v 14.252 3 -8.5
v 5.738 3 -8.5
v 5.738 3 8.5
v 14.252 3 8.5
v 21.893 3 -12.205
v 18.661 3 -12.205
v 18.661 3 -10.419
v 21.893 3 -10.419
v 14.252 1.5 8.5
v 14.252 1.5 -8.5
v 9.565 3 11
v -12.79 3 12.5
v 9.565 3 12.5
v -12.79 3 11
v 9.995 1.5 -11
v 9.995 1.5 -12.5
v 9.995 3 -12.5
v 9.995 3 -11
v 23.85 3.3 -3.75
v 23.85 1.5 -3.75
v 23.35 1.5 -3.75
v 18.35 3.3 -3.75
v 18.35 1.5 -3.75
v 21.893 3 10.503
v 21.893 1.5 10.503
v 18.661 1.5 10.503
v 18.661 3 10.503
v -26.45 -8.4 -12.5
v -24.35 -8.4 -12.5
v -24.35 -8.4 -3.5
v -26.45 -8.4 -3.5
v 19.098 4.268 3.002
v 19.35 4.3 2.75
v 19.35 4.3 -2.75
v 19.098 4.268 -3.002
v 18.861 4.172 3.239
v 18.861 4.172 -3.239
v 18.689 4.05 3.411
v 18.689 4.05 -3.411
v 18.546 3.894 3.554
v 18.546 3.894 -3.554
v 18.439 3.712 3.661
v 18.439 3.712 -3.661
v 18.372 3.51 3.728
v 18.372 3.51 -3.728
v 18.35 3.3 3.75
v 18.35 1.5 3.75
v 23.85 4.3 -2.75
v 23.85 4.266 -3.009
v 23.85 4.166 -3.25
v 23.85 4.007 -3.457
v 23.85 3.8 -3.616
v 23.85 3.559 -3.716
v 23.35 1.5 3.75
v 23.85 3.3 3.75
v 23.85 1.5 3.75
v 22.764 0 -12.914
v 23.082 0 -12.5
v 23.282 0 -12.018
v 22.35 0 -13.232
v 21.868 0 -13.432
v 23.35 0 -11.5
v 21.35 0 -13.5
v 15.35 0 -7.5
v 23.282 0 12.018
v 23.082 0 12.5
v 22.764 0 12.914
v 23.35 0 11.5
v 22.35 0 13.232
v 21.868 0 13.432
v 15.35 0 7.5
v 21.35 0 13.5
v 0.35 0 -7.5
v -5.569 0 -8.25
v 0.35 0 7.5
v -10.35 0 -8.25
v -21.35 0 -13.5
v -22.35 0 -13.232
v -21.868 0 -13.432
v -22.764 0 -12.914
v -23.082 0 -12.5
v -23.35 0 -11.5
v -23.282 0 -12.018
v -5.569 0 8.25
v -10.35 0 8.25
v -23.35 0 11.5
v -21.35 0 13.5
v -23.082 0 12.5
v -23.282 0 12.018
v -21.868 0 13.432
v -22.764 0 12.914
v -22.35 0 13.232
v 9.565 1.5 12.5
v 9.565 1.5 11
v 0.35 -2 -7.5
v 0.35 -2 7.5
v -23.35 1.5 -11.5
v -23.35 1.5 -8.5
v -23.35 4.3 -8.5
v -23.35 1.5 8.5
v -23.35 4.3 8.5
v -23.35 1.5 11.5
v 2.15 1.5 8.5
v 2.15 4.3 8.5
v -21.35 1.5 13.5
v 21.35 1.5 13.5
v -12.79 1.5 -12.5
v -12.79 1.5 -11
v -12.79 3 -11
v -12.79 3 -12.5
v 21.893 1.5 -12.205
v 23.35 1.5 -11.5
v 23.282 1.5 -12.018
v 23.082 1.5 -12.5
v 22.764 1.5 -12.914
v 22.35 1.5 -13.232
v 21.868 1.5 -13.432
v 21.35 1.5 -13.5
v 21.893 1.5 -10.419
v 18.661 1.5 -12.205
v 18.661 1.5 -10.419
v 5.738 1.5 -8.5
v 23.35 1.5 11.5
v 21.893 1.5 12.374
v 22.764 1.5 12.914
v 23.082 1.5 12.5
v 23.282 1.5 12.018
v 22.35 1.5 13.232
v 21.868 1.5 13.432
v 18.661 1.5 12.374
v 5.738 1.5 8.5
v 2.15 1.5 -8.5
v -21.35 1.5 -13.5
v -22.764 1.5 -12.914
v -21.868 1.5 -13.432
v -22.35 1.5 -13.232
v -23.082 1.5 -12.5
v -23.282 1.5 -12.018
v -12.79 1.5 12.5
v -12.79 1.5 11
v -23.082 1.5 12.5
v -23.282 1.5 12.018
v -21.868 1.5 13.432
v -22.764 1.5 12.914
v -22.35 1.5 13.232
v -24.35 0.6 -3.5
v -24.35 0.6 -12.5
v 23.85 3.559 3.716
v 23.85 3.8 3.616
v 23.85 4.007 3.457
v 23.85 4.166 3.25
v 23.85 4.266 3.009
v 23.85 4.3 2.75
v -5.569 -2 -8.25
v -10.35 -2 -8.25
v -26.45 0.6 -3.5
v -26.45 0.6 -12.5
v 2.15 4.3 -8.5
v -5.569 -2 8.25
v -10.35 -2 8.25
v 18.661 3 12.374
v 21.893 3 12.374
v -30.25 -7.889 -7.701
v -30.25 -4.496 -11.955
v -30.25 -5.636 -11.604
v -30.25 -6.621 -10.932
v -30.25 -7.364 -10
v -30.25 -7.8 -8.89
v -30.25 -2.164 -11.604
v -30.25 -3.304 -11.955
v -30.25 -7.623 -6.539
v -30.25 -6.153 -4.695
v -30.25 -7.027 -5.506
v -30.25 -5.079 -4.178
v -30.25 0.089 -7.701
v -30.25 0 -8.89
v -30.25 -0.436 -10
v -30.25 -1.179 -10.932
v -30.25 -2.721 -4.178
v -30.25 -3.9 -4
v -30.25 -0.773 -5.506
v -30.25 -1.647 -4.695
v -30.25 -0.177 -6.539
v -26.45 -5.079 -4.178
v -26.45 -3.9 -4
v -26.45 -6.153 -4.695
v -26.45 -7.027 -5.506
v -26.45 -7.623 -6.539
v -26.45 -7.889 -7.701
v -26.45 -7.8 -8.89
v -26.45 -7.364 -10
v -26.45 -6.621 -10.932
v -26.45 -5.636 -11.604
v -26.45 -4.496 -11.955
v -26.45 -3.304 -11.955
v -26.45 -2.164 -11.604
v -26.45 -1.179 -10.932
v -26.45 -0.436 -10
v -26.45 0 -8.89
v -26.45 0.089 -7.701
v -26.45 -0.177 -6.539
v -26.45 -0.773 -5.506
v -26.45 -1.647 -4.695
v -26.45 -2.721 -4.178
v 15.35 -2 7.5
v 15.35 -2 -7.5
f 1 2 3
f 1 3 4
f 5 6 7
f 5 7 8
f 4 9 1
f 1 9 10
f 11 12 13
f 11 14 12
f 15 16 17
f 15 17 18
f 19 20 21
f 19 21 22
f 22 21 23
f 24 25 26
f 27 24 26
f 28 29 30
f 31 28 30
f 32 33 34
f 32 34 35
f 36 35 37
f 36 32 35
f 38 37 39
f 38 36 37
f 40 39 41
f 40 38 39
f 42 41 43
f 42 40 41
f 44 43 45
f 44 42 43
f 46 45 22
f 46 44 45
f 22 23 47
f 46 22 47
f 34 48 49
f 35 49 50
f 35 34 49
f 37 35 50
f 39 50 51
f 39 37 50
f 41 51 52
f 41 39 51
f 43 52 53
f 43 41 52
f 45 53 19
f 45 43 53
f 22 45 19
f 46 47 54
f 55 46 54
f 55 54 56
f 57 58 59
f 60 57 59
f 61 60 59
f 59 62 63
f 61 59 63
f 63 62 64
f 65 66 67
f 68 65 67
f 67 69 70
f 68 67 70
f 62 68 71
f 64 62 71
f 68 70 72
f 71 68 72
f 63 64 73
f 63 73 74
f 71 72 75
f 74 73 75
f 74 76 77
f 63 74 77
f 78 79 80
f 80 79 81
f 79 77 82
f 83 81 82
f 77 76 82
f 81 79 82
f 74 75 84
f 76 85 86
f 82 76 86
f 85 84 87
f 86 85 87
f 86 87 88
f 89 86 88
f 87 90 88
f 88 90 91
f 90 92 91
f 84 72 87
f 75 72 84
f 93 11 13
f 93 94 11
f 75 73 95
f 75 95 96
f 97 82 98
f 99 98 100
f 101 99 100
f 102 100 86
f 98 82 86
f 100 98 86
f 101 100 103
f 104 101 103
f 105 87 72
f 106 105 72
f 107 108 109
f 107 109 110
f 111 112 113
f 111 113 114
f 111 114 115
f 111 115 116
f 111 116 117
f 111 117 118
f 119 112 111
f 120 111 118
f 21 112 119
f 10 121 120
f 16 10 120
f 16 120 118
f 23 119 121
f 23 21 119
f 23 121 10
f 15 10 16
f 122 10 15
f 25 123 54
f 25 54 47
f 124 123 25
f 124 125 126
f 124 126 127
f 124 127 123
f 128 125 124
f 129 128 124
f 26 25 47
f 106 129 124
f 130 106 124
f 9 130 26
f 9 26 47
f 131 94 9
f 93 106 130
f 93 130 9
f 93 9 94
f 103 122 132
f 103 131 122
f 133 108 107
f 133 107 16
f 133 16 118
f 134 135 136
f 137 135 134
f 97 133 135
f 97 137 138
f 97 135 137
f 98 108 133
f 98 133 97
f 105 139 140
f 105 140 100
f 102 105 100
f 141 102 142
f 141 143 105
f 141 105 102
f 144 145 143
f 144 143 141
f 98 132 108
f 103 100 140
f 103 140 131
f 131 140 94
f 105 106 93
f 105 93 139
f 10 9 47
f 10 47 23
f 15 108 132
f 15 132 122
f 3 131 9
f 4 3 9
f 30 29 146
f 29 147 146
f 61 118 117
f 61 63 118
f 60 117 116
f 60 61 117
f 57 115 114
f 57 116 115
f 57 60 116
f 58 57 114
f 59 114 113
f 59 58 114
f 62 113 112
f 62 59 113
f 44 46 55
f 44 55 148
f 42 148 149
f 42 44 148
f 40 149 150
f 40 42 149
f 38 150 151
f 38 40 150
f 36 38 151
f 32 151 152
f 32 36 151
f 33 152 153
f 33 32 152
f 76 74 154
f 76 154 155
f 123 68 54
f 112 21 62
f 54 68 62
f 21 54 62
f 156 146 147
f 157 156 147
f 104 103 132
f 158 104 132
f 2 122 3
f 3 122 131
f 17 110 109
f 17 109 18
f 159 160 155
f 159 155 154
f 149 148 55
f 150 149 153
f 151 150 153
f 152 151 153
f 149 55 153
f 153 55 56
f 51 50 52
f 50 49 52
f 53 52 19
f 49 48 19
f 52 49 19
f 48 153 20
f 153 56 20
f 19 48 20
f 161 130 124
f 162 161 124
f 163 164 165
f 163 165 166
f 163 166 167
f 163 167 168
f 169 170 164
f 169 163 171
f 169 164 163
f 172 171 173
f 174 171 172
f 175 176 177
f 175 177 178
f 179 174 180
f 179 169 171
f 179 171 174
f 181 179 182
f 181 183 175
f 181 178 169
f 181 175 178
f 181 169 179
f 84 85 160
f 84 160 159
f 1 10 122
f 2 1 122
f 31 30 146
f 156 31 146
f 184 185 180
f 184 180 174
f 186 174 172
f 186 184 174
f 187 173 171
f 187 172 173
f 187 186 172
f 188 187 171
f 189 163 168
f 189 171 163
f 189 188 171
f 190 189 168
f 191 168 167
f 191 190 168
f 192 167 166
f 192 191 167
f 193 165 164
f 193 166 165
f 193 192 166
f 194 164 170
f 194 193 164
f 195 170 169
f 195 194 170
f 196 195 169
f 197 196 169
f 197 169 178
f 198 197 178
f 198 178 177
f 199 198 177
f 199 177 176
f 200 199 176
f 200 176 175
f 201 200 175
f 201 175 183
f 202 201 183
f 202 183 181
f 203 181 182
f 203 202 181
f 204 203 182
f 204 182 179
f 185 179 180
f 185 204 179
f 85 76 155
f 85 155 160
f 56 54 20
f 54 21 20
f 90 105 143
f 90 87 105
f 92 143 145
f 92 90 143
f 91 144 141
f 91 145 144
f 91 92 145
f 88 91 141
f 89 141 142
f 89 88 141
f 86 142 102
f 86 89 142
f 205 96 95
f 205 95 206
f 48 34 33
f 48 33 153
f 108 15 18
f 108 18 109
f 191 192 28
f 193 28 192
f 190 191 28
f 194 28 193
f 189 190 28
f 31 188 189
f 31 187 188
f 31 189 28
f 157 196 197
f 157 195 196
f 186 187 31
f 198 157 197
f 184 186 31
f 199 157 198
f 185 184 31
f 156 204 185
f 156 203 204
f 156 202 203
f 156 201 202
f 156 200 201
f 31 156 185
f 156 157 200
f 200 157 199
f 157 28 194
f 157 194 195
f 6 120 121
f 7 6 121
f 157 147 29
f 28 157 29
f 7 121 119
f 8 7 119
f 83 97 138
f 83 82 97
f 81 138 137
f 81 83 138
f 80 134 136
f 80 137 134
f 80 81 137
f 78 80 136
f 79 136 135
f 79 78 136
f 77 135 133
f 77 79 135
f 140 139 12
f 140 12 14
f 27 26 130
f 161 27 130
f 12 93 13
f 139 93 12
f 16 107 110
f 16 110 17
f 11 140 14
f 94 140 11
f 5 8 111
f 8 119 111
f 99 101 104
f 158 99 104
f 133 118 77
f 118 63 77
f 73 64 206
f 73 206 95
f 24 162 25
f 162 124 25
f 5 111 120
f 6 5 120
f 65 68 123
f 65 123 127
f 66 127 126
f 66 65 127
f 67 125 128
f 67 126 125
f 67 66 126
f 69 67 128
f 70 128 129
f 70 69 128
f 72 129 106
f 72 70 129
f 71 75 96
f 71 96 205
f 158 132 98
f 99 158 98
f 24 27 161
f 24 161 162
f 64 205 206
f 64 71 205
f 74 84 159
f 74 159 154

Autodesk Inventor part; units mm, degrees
ref_plane "YZ Plane" through (0, 0, 0) normal (1, 0, 0) x (0, 1, 0)
ref_plane "XZ Plane" through (0, 0, 0) normal (0, 1, 0) x (-1, 0, 0)
ref_plane "XY Plane" through (0, 0, 0) normal (0, 0, 1) x (1, 0, 0)
sketch "Skizze1" plane through (0, 0, 0) normal (0, 1, 0) x (-1, 0, 0)
  line L0 (-21.35, -13.5) -> (21.35, -13.5)
  line L1 (23.35, -11.5) -> (23.35, 11.5)
  line L2 (21.35, 13.5) -> (-21.35, 13.5)
  line L3 (-23.35, 11.5) -> (-23.35, -11.5)
  line L4 (-23.35, -13.5) -> (23.35, 13.5) construction
  line L5 (23.35, -13.5) -> (-23.35, 13.5) construction
  arc A0 (23.35, 11.5) -> (21.35, 13.5) centre (21.35, 11.5) ccw
  arc A1 (21.35, -13.5) -> (23.35, -11.5) centre (21.35, -11.5) ccw
  arc A2 (-23.35, -11.5) -> (-21.35, -13.5) centre (-21.35, -11.5) ccw
  arc A3 (-21.35, 13.5) -> (-23.35, 11.5) centre (-21.35, 11.5) ccw
  point P0 (0, 0)
  dimension "d0" = 46.7
  dimension "d1" = 27
  dimension "d2" = 2
extrude "Extrusion1" add sketch "Skizze1" along normal blind 1.5
sketch "Skizze2" plane through (0, 1.5, 0) normal (0, 1, 0) x (1, 0, 0)
  line L0 (-21.35, -13.5) -> (21.35, -13.5) projected
  arc A0 (21.35, -13.5) -> (23.35, -11.5) centre (21.35, -11.5) ccw projected
  line L1 (23.35, -11.5) -> (23.35, 11.5) projected
  arc A1 (23.35, 11.5) -> (21.35, 13.5) centre (21.35, 11.5) ccw projected
  line L2 (21.35, 13.5) -> (-21.35, 13.5) projected
  arc A2 (-21.35, 13.5) -> (-23.35, 11.5) centre (-21.35, 11.5) ccw projected
  line L3 (-23.35, 11.5) -> (-23.35, -11.5) projected
  arc A3 (-23.35, -11.5) -> (-21.35, -13.5) centre (-21.35, -11.5) ccw projected
  line L4 (18.35, -3.75) -> (23.85, -3.75)
  line L5 (23.85, -3.75) -> (23.85, 3.75)
  line L6 (23.85, 3.75) -> (18.35, 3.75)
  line L7 (18.35, 3.75) -> (18.35, -3.75)
  line L8 (18.35, -3.75) -> (23.85, 3.75) construction
  line L9 (23.85, -3.75) -> (18.35, 3.75) construction
  point P0 (0, 0)
  point P1 (21.1, 0)
  dimension "d5" = 5.5
  dimension "d6" = 7.5
  dimension "d7" = 0.5
extrude "Extrusion2" add sketch "Skizze2" along normal blind 2.8 contours L4 L7 L6 L1 | L1 L6 L5 L4
fillet "Rundung1" radius 1 3 edges at (21.1, 4.3, 3.75) (21.1, 4.3, -3.75) (18.35, 4.3, 0)
sketch "Skizze3" plane through (0, 1.5, 0) normal (0, -1, 0) x (1, 0, 0)
  line L0 (-21.35, 13.5) -> (21.35, 13.5) projected
  arc A0 (-21.35, 13.5) -> (-23.35, 11.5) centre (-21.35, 11.5) ccw projected
  line L1 (-23.35, -11.5) -> (-23.35, 11.5) projected
  arc A1 (-23.35, -11.5) -> (-21.35, -13.5) centre (-21.35, -11.5) ccw projected
  line L2 (21.35, -13.5) -> (-21.35, -13.5) projected
  arc A2 (21.35, -13.5) -> (23.35, -11.5) centre (21.35, -11.5) ccw projected
  line L3 (23.35, 11.5) -> (23.35, -11.5) projected
  arc A3 (23.35, 11.5) -> (21.35, 13.5) centre (21.35, 11.5) ccw projected
  line L4 (2.15, -8.5) -> (-23.35, -8.5)
  line L5 (-23.35, -8.5) -> (-23.35, 8.5)
  line L6 (-23.35, 8.5) -> (2.15, 8.5)
  line L7 (2.15, 8.5) -> (2.15, -8.5)
  line L8 (2.15, -8.5) -> (-23.35, 8.5) construction
  line L9 (-23.35, -8.5) -> (2.15, 8.5) construction
  point P0 (0, 0)
  point P1 (-10.6, 0)
  point P2 (-23.35, 0)
  dimension "d11" = 25.5
  dimension "d12" = 17
extrude "Extrusion3" add sketch "Skizze3" against normal blind 2.8 contours L6 L7 L4 L1
sketch "Skizze5" plane through (0, 0, 0) normal (0, -1, 0) x (1, 0, 0)
  line L0 (-21.35, 13.5) -> (21.35, 13.5) projected
  arc A0 (-21.35, 13.5) -> (-23.35, 11.5) centre (-21.35, 11.5) ccw projected
  line L1 (-23.35, -11.5) -> (-23.35, 11.5) projected
  arc A1 (-23.35, -11.5) -> (-21.35, -13.5) centre (-21.35, -11.5) ccw projected
  line L2 (21.35, -13.5) -> (-21.35, -13.5) projected
  arc A2 (21.35, -13.5) -> (23.35, -11.5) centre (21.35, -11.5) ccw projected
  line L3 (23.35, 11.5) -> (23.35, -11.5) projected
  arc A3 (23.35, 11.5) -> (21.35, 13.5) centre (21.35, 11.5) ccw projected
  line L4 (-5.5686, -8.25) -> (-10.35, -8.25)
  line L5 (-10.35, -8.25) -> (-10.35, 8.25)
  line L6 (-10.35, 8.25) -> (-5.5686, 8.25)
  line L7 (-5.5686, 8.25) -> (-5.5686, -8.25)
  line L8 (-5.5686, -8.25) -> (-10.35, 8.25) construction
  line L9 (-10.35, -8.25) -> (-5.5686, 8.25) construction
  line L10 (15.35, -7.5) -> (0.35, -7.5)
  line L11 (0.35, -7.5) -> (0.35, 7.5)
  line L12 (0.35, 7.5) -> (15.35, 7.5)
  line L13 (15.35, 7.5) -> (15.35, -7.5)
  line L14 (15.35, -7.5) -> (0.35, 7.5) construction
  line L15 (0.35, -7.5) -> (15.35, 7.5) construction
  point P0 (0, 0)
  point P1 (-7.9593, 0)
  point P2 (7.85, 0)
  dimension "d23" = 15
  dimension "d24" = 15
  dimension "d25" = 13
  dimension "d26" = 16.5
  dimension "d27" = 8
extrude "Extrusion5" add sketch "Skizze5" along normal blind 2 contours L4 L5 L6 L7 | L10 L11 L12 L13
ref_plane "Arbeitsebene1" through (-24.35, 0, -11.5) normal (-1, 0, 0) x (0, 0, 1)
sketch "Skizze8" plane through (-24.35, 0, -11.5) normal (-1, 0, 0) x (0, 0, 1)
  line L0 (8, 0.6) -> (-1, 0.6)
  line L1 (-1, 0.6) -> (-1, -8.4)
  line L2 (-1, -8.4) -> (8, -8.4)
  line L3 (8, -8.4) -> (8, 0.6)
  line L4 (8, 0.6) -> (-1, -8.4) construction
  line L5 (-1, 0.6) -> (8, -8.4) construction
  line L6 (0, 0) -> (23, 0) projected
  line L7 (3, 4.3) -> (20, 4.3) projected
  line L8 (19.75, -2) -> (3.25, -2) projected
  line L9 (0, 0) -> (-2, 0) projected
  line L10 (-2, 0) -> (-2, 1.5) projected
  point P0 (11.5, 0)
  point P1 (3.5, -3.9)
  dimension "d40" = 9
  dimension "d41" = 9
  dimension "d54" = 1
  dimension "d62" = 0.6
extrude "Extrusion8" add sketch "Skizze8" along normal blind 2.1
sketch "Skizze9" plane through (-26.45, 0, -11.5) normal (-1, 0, 0) x (0, 0, 1)
  line L0 (8, 0.6) -> (-1, 0.6) projected
  line L1 (-1, 0.6) -> (-1, -8.4) projected
  line L2 (-1, -8.4) -> (8, -8.4) projected
  line L3 (8, -8.4) -> (8, 0.6) projected
  circle A0 centre (3.5, -3.9) radius 4
  point P0 (11.5, 0)
  dimension "d45" = 8
  dimension "d49" = 4.5
  dimension "d50" = 4.5
extrude "Extrusion9" add sketch "Skizze9" along normal blind 3.8 contours A0
sketch "Skizze10" plane through (0, 1.5, 0) normal (0, 1, 0) x (1, 0, 0)
  line L0 (2.15, -8.5) -> (-23.35, -8.5) projected
  line L1 (-23.35, -8.5) -> (-23.35, -11.5) projected
  arc A0 (-23.35, -11.5) -> (-21.35, -13.5) centre (-21.35, -11.5) ccw projected
  line L2 (-21.35, -13.5) -> (21.35, -13.5) projected
  arc A1 (21.35, -13.5) -> (23.35, -11.5) centre (21.35, -11.5) ccw projected
  line L3 (23.35, -11.5) -> (23.35, -3.75) projected
  line L4 (23.35, -3.75) -> (18.35, -3.75) projected
  line L5 (18.35, -3.75) -> (18.35, 3.75) projected
  line L6 (18.35, 3.75) -> (23.35, 3.75) projected
  line L7 (23.35, 3.75) -> (23.35, 11.5) projected
  arc A2 (23.35, 11.5) -> (21.35, 13.5) centre (21.35, 11.5) ccw projected
  line L8 (21.35, 13.5) -> (-21.35, 13.5) projected
  arc A3 (-21.35, 13.5) -> (-23.35, 11.5) centre (-21.35, 11.5) ccw projected
  line L9 (-23.35, 11.5) -> (-23.35, 8.5) projected
  line L10 (-23.35, 8.5) -> (2.15, 8.5) projected
  line L11 (2.15, 8.5) -> (2.15, -8.5) projected
  line L12 (21.893, 12.205) -> (18.6612, 12.205)
  line L13 (18.6612, 12.205) -> (18.6612, 10.419)
  line L14 (18.6612, 10.419) -> (21.893, 10.419)
  line L15 (21.893, 10.419) -> (21.893, 12.205)
  line L16 (21.893, -10.5027) -> (18.6612, -10.5027)
  line L17 (18.6612, -10.5027) -> (18.6612, -12.3737)
  line L18 (18.6612, -12.3737) -> (21.893, -12.3737)
  line L19 (21.893, -12.3737) -> (21.893, -10.5027)
  line L20 (14.2522, 8.5) -> (5.7379, 8.5)
  line L21 (5.7379, 8.5) -> (5.7379, -8.5)
  line L22 (5.7379, -8.5) -> (14.2522, -8.5)
  line L23 (14.2522, -8.5) -> (14.2522, 8.5)
  line L24 (9.5652, -12.5) -> (-12.7904, -12.5)
  line L25 (-12.7904, -12.5) -> (-12.7904, -11)
  line L26 (-12.7904, -11) -> (9.5652, -11)
  line L27 (9.5652, -11) -> (9.5652, -12.5)
  line L28 (9.995, 11) -> (-12.7904, 11)
  line L29 (-12.7904, 11) -> (-12.7904, 12.5)
  line L30 (-12.7904, 12.5) -> (9.995, 12.5)
  line L31 (9.995, 12.5) -> (9.995, 11)
  point P0 (0, 0)
  dimension "d58" = 1
  dimension "d59" = 1
  dimension "d60" = 1.5
  dimension "d61" = 1.5
extrude "Extrusion10" add sketch "Skizze10" along normal blind 1.5 contours L15 L14 L13 L12 | L19 L18 L17 L16 | L23 L22 L21 L20 | L24 L25 L26 L27 | L28 L29 L30 L31
properties part number "00_ESP32_Board"
